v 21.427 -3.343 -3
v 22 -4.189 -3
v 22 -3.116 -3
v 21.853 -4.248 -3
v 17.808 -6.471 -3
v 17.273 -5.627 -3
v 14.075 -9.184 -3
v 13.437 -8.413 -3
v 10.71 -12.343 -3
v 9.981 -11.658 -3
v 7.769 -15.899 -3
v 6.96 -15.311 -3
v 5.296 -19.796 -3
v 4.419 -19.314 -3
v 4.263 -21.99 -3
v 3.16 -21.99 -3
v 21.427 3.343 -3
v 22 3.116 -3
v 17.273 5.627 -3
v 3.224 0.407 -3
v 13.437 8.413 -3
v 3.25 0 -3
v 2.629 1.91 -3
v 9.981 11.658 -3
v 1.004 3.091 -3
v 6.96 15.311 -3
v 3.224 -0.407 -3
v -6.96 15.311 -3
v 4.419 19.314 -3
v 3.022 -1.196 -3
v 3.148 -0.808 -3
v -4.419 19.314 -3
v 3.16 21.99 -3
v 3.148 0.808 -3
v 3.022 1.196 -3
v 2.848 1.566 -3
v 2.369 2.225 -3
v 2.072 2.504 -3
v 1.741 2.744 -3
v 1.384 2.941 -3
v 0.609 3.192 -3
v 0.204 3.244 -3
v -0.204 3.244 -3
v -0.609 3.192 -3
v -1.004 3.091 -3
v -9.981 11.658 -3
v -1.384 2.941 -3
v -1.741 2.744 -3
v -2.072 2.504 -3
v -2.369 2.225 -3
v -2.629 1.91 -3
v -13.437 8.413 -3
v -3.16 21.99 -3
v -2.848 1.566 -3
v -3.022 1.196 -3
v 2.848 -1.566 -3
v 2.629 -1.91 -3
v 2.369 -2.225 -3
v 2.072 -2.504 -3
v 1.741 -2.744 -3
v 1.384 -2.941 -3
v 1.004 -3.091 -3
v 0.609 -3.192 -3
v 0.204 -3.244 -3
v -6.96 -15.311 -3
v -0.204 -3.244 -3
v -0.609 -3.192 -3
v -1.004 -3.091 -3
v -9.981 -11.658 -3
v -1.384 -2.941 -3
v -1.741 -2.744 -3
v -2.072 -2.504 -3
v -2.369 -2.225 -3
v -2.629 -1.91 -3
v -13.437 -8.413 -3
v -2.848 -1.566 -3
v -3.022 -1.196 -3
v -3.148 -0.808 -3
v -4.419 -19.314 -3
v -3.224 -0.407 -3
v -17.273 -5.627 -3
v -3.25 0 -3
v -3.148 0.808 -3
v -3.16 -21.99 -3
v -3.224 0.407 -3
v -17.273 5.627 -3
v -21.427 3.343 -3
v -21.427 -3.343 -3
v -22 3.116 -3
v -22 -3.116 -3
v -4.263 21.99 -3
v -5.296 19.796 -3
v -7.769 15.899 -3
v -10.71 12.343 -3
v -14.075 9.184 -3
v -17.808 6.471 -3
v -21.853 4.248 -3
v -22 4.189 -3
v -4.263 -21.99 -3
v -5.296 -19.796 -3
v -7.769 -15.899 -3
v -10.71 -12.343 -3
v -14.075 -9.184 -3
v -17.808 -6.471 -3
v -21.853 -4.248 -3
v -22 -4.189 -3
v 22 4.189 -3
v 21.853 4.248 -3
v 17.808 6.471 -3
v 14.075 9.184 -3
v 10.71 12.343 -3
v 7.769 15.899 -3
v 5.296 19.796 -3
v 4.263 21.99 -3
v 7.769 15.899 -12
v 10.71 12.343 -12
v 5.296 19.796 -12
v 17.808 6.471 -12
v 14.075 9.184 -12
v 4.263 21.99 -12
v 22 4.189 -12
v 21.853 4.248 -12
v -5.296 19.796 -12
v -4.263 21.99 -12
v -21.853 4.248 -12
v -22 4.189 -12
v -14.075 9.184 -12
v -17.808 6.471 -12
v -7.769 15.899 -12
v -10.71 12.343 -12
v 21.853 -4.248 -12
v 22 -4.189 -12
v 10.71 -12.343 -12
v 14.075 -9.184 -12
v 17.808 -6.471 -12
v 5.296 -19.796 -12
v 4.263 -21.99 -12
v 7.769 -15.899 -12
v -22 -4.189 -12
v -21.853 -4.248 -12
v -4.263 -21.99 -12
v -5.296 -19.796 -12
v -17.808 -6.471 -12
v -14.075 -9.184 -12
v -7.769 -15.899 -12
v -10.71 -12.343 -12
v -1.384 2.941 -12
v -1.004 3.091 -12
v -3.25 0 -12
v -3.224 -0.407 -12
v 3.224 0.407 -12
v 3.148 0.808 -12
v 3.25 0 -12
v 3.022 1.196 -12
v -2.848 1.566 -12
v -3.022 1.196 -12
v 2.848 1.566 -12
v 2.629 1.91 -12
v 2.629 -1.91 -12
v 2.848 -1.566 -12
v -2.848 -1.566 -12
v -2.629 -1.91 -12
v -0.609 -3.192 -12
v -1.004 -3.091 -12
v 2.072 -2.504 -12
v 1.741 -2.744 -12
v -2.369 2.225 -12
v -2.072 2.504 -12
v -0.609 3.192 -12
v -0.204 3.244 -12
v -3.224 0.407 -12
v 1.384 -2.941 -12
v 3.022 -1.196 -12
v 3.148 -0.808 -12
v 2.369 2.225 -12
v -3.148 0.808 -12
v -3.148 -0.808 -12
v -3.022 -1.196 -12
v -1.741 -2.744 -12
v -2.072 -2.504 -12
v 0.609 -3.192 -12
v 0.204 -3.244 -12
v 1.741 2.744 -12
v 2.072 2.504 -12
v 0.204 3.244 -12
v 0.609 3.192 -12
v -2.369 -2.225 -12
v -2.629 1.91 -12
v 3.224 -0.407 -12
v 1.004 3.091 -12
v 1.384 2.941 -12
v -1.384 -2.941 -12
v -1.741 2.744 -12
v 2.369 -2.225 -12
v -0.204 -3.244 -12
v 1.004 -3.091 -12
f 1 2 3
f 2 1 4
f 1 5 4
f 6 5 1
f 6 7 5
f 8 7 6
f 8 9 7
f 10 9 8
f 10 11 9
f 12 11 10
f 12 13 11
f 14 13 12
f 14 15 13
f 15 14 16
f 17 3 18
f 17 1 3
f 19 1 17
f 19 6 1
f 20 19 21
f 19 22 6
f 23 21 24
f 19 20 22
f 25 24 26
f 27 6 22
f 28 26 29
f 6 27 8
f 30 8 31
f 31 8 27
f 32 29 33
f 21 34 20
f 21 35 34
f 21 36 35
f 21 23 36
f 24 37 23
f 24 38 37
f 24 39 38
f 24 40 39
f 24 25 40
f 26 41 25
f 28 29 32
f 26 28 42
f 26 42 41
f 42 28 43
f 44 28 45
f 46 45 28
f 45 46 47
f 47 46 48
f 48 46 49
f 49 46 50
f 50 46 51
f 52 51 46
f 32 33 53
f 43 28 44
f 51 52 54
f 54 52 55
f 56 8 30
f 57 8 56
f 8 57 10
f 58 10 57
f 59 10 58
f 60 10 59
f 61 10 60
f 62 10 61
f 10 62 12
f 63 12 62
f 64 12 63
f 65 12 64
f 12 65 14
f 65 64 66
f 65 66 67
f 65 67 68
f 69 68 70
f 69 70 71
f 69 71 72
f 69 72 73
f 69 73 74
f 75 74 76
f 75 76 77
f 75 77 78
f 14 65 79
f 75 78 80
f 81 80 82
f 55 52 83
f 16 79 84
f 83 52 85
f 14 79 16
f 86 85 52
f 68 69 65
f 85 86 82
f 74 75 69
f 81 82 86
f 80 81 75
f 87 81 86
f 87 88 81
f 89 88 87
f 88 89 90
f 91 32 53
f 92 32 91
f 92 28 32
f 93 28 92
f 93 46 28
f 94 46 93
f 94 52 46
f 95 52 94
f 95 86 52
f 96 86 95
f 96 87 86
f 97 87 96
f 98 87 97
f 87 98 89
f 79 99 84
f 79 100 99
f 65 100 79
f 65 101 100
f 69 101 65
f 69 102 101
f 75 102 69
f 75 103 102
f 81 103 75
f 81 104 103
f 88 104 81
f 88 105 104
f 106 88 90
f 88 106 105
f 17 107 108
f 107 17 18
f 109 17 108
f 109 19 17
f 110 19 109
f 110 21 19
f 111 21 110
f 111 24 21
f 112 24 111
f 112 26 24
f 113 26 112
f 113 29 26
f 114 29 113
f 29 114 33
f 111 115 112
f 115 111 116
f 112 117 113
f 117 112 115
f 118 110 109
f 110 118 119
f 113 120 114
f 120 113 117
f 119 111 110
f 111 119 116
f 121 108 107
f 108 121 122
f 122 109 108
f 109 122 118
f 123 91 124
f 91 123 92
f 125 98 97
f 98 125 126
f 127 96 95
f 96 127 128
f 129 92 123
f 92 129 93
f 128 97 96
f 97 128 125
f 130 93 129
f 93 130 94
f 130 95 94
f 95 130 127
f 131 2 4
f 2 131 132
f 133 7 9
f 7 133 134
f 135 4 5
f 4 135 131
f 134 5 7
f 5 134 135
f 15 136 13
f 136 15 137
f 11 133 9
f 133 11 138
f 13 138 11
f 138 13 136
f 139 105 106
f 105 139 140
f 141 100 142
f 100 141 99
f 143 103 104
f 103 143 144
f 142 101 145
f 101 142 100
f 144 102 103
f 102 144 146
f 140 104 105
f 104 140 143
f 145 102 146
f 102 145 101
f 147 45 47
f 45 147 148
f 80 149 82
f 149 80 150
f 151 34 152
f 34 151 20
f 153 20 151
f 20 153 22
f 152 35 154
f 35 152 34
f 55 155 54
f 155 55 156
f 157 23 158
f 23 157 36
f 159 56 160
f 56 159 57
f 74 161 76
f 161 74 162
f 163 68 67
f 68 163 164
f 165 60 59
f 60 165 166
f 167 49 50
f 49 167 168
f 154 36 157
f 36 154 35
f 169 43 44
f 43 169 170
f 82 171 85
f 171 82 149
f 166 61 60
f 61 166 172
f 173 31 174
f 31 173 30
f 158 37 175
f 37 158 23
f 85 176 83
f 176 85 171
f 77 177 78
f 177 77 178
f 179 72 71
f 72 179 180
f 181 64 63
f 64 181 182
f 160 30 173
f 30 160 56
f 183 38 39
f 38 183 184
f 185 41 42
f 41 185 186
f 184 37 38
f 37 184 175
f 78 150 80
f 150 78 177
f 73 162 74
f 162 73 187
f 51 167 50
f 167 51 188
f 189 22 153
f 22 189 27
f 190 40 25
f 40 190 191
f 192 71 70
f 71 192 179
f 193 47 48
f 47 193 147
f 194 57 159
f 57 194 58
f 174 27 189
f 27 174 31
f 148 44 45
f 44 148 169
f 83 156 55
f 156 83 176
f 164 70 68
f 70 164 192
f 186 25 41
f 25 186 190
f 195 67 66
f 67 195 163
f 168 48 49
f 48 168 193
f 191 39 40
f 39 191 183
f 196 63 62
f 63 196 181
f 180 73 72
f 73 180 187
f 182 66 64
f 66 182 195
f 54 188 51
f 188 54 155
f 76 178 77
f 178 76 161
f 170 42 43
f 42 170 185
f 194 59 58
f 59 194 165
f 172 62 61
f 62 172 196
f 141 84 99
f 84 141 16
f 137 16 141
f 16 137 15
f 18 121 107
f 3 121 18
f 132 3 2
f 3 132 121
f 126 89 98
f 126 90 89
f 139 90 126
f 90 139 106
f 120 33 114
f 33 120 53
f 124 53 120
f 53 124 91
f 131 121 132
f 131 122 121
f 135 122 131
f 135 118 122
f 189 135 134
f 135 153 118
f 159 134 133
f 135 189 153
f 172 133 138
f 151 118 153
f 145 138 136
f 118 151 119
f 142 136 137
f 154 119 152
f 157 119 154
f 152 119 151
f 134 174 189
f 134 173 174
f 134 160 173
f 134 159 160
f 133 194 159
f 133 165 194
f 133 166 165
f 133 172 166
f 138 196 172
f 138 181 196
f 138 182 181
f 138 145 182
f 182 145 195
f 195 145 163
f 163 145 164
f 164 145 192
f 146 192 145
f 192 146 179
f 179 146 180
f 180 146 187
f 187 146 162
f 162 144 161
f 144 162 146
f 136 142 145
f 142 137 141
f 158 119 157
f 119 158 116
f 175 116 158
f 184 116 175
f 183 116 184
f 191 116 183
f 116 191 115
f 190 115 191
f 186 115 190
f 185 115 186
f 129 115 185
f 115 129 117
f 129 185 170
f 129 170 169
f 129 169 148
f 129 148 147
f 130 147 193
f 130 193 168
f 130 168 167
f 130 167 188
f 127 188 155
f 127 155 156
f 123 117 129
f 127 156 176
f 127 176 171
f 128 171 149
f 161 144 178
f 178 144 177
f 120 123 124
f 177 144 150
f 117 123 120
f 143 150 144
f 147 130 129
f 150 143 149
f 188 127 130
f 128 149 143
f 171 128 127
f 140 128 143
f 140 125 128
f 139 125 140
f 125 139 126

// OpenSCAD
$fn = 50;


difference() {
	union() {
		translate(v = [0, 0, -12]) {
			hull() {
				translate(v = [-17.0000000000, 17.0000000000, 0]) {
					cylinder(h = 9, r = 5);
				}
				translate(v = [17.0000000000, 17.0000000000, 0]) {
					cylinder(h = 9, r = 5);
				}
				translate(v = [-17.0000000000, -17.0000000000, 0]) {
					cylinder(h = 9, r = 5);
				}
				translate(v = [17.0000000000, -17.0000000000, 0]) {
					cylinder(h = 9, r = 5);
				}
			}
		}
	}
	union() {
		translate(v = [37.5000000000, 37.5000000000, -3]) {
			rotate(a = [0, 0, 0]) {
				difference() {
					union() {
						cylinder(h = 3, r = 37.7500000000);
					}
					union() {
						cylinder(h = 3, r = 36.7500000000);
					}
				}
			}
		}
		translate(v = [37.5000000000, 37.5000000000, -3]) {
			rotate(a = [0, 0, 0]) {
				difference() {
					union() {
						cylinder(h = 1, r = 36.7500000000);
					}
					union() {
						cylinder(h = 1, r = 33.7500000000);
					}
				}
			}
		}
		translate(v = [37.5000000000, 37.5000000000, -109]) {
			rotate(a = [0, 0, 0]) {
				difference() {
					union() {
						cylinder(h = 3, r = 36.7500000000);
					}
					union() {
						cylinder(h = 3, r = 35.7500000000);
					}
				}
			}
		}
		translate(v = [-37.5000000000, 37.5000000000, -3]) {
			rotate(a = [0, 0, 0]) {
				difference() {
					union() {
						cylinder(h = 3, r = 37.7500000000);
					}
					union() {
						cylinder(h = 3, r = 36.7500000000);
					}
				}
			}
		}
		translate(v = [-37.5000000000, 37.5000000000, -3]) {
			rotate(a = [0, 0, 0]) {
				difference() {
					union() {
						cylinder(h = 1, r = 36.7500000000);
					}
					union() {
						cylinder(h = 1, r = 33.7500000000);
					}
				}
			}
		}
		translate(v = [-37.5000000000, 37.5000000000, -109]) {
			rotate(a = [0, 0, 0]) {
				difference() {
					union() {
						cylinder(h = 3, r = 36.7500000000);
					}
					union() {
						cylinder(h = 3, r = 35.7500000000);
					}
				}
			}
		}
		translate(v = [37.5000000000, -37.5000000000, -3]) {
			rotate(a = [0, 0, 0]) {
				difference() {
					union() {
						cylinder(h = 3, r = 37.7500000000);
					}
					union() {
						cylinder(h = 3, r = 36.7500000000);
					}
				}
			}
		}
		translate(v = [37.5000000000, -37.5000000000, -3]) {
			rotate(a = [0, 0, 0]) {
				difference() {
					union() {
						cylinder(h = 1, r = 36.7500000000);
					}
					union() {
						cylinder(h = 1, r = 33.7500000000);
					}
				}
			}
		}
		translate(v = [37.5000000000, -37.5000000000, -109]) {
			rotate(a = [0, 0, 0]) {
				difference() {
					union() {
						cylinder(h = 3, r = 36.7500000000);
					}
					union() {
						cylinder(h = 3, r = 35.7500000000);
					}
				}
			}
		}
		translate(v = [-37.5000000000, -37.5000000000, -3]) {
			rotate(a = [0, 0, 0]) {
				difference() {
					union() {
						cylinder(h = 3, r = 37.7500000000);
					}
					union() {
						cylinder(h = 3, r = 36.7500000000);
					}
				}
			}
		}
		translate(v = [-37.5000000000, -37.5000000000, -3]) {
			rotate(a = [0, 0, 0]) {
				difference() {
					union() {
						cylinder(h = 1, r = 36.7500000000);
					}
					union() {
						cylinder(h = 1, r = 33.7500000000);
					}
				}
			}
		}
		translate(v = [-37.5000000000, -37.5000000000, -109]) {
			rotate(a = [0, 0, 0]) {
				difference() {
					union() {
						cylinder(h = 3, r = 36.7500000000);
					}
					union() {
						cylinder(h = 3, r = 35.7500000000);
					}
				}
			}
		}
		translate(v = [37.5000000000, 37.5000000000, -106.0000000000]) {
			cylinder(h = 103, r = 36.7500000000);
		}
		translate(v = [37.5000000000, 37.5000000000, -106.5000000000]) {
			cylinder(h = 1, r = 36.7500000000);
		}
		translate(v = [-37.5000000000, 37.5000000000, -106.0000000000]) {
			cylinder(h = 103, r = 36.7500000000);
		}
		translate(v = [-37.5000000000, 37.5000000000, -106.5000000000]) {
			cylinder(h = 1, r = 36.7500000000);
		}
		translate(v = [37.5000000000, -37.5000000000, -106.0000000000]) {
			cylinder(h = 103, r = 36.7500000000);
		}
		translate(v = [37.5000000000, -37.5000000000, -106.5000000000]) {
			cylinder(h = 1, r = 36.7500000000);
		}
		translate(v = [-37.5000000000, -37.5000000000, -106.0000000000]) {
			cylinder(h = 103, r = 36.7500000000);
		}
		translate(v = [-37.5000000000, -37.5000000000, -106.5000000000]) {
			cylinder(h = 1, r = 36.7500000000);
		}
		translate(v = [-16.5000000000, -16.5000000000, -125.0000000000]) {
			cylinder(h = 250, r = 3.2500000000);
		}
		translate(v = [16.5000000000, -16.5000000000, -125.0000000000]) {
			cylinder(h = 250, r = 3.2500000000);
		}
		translate(v = [-16.5000000000, 16.5000000000, -125.0000000000]) {
			cylinder(h = 250, r = 3.2500000000);
		}
		translate(v = [16.5000000000, 16.5000000000, -125.0000000000]) {
			cylinder(h = 250, r = 3.2500000000);
		}
		translate(v = [0.0000000000, 0.0000000000, -125.0000000000]) {
			cylinder(h = 250, r = 3.2500000000);
		}
	}
}
